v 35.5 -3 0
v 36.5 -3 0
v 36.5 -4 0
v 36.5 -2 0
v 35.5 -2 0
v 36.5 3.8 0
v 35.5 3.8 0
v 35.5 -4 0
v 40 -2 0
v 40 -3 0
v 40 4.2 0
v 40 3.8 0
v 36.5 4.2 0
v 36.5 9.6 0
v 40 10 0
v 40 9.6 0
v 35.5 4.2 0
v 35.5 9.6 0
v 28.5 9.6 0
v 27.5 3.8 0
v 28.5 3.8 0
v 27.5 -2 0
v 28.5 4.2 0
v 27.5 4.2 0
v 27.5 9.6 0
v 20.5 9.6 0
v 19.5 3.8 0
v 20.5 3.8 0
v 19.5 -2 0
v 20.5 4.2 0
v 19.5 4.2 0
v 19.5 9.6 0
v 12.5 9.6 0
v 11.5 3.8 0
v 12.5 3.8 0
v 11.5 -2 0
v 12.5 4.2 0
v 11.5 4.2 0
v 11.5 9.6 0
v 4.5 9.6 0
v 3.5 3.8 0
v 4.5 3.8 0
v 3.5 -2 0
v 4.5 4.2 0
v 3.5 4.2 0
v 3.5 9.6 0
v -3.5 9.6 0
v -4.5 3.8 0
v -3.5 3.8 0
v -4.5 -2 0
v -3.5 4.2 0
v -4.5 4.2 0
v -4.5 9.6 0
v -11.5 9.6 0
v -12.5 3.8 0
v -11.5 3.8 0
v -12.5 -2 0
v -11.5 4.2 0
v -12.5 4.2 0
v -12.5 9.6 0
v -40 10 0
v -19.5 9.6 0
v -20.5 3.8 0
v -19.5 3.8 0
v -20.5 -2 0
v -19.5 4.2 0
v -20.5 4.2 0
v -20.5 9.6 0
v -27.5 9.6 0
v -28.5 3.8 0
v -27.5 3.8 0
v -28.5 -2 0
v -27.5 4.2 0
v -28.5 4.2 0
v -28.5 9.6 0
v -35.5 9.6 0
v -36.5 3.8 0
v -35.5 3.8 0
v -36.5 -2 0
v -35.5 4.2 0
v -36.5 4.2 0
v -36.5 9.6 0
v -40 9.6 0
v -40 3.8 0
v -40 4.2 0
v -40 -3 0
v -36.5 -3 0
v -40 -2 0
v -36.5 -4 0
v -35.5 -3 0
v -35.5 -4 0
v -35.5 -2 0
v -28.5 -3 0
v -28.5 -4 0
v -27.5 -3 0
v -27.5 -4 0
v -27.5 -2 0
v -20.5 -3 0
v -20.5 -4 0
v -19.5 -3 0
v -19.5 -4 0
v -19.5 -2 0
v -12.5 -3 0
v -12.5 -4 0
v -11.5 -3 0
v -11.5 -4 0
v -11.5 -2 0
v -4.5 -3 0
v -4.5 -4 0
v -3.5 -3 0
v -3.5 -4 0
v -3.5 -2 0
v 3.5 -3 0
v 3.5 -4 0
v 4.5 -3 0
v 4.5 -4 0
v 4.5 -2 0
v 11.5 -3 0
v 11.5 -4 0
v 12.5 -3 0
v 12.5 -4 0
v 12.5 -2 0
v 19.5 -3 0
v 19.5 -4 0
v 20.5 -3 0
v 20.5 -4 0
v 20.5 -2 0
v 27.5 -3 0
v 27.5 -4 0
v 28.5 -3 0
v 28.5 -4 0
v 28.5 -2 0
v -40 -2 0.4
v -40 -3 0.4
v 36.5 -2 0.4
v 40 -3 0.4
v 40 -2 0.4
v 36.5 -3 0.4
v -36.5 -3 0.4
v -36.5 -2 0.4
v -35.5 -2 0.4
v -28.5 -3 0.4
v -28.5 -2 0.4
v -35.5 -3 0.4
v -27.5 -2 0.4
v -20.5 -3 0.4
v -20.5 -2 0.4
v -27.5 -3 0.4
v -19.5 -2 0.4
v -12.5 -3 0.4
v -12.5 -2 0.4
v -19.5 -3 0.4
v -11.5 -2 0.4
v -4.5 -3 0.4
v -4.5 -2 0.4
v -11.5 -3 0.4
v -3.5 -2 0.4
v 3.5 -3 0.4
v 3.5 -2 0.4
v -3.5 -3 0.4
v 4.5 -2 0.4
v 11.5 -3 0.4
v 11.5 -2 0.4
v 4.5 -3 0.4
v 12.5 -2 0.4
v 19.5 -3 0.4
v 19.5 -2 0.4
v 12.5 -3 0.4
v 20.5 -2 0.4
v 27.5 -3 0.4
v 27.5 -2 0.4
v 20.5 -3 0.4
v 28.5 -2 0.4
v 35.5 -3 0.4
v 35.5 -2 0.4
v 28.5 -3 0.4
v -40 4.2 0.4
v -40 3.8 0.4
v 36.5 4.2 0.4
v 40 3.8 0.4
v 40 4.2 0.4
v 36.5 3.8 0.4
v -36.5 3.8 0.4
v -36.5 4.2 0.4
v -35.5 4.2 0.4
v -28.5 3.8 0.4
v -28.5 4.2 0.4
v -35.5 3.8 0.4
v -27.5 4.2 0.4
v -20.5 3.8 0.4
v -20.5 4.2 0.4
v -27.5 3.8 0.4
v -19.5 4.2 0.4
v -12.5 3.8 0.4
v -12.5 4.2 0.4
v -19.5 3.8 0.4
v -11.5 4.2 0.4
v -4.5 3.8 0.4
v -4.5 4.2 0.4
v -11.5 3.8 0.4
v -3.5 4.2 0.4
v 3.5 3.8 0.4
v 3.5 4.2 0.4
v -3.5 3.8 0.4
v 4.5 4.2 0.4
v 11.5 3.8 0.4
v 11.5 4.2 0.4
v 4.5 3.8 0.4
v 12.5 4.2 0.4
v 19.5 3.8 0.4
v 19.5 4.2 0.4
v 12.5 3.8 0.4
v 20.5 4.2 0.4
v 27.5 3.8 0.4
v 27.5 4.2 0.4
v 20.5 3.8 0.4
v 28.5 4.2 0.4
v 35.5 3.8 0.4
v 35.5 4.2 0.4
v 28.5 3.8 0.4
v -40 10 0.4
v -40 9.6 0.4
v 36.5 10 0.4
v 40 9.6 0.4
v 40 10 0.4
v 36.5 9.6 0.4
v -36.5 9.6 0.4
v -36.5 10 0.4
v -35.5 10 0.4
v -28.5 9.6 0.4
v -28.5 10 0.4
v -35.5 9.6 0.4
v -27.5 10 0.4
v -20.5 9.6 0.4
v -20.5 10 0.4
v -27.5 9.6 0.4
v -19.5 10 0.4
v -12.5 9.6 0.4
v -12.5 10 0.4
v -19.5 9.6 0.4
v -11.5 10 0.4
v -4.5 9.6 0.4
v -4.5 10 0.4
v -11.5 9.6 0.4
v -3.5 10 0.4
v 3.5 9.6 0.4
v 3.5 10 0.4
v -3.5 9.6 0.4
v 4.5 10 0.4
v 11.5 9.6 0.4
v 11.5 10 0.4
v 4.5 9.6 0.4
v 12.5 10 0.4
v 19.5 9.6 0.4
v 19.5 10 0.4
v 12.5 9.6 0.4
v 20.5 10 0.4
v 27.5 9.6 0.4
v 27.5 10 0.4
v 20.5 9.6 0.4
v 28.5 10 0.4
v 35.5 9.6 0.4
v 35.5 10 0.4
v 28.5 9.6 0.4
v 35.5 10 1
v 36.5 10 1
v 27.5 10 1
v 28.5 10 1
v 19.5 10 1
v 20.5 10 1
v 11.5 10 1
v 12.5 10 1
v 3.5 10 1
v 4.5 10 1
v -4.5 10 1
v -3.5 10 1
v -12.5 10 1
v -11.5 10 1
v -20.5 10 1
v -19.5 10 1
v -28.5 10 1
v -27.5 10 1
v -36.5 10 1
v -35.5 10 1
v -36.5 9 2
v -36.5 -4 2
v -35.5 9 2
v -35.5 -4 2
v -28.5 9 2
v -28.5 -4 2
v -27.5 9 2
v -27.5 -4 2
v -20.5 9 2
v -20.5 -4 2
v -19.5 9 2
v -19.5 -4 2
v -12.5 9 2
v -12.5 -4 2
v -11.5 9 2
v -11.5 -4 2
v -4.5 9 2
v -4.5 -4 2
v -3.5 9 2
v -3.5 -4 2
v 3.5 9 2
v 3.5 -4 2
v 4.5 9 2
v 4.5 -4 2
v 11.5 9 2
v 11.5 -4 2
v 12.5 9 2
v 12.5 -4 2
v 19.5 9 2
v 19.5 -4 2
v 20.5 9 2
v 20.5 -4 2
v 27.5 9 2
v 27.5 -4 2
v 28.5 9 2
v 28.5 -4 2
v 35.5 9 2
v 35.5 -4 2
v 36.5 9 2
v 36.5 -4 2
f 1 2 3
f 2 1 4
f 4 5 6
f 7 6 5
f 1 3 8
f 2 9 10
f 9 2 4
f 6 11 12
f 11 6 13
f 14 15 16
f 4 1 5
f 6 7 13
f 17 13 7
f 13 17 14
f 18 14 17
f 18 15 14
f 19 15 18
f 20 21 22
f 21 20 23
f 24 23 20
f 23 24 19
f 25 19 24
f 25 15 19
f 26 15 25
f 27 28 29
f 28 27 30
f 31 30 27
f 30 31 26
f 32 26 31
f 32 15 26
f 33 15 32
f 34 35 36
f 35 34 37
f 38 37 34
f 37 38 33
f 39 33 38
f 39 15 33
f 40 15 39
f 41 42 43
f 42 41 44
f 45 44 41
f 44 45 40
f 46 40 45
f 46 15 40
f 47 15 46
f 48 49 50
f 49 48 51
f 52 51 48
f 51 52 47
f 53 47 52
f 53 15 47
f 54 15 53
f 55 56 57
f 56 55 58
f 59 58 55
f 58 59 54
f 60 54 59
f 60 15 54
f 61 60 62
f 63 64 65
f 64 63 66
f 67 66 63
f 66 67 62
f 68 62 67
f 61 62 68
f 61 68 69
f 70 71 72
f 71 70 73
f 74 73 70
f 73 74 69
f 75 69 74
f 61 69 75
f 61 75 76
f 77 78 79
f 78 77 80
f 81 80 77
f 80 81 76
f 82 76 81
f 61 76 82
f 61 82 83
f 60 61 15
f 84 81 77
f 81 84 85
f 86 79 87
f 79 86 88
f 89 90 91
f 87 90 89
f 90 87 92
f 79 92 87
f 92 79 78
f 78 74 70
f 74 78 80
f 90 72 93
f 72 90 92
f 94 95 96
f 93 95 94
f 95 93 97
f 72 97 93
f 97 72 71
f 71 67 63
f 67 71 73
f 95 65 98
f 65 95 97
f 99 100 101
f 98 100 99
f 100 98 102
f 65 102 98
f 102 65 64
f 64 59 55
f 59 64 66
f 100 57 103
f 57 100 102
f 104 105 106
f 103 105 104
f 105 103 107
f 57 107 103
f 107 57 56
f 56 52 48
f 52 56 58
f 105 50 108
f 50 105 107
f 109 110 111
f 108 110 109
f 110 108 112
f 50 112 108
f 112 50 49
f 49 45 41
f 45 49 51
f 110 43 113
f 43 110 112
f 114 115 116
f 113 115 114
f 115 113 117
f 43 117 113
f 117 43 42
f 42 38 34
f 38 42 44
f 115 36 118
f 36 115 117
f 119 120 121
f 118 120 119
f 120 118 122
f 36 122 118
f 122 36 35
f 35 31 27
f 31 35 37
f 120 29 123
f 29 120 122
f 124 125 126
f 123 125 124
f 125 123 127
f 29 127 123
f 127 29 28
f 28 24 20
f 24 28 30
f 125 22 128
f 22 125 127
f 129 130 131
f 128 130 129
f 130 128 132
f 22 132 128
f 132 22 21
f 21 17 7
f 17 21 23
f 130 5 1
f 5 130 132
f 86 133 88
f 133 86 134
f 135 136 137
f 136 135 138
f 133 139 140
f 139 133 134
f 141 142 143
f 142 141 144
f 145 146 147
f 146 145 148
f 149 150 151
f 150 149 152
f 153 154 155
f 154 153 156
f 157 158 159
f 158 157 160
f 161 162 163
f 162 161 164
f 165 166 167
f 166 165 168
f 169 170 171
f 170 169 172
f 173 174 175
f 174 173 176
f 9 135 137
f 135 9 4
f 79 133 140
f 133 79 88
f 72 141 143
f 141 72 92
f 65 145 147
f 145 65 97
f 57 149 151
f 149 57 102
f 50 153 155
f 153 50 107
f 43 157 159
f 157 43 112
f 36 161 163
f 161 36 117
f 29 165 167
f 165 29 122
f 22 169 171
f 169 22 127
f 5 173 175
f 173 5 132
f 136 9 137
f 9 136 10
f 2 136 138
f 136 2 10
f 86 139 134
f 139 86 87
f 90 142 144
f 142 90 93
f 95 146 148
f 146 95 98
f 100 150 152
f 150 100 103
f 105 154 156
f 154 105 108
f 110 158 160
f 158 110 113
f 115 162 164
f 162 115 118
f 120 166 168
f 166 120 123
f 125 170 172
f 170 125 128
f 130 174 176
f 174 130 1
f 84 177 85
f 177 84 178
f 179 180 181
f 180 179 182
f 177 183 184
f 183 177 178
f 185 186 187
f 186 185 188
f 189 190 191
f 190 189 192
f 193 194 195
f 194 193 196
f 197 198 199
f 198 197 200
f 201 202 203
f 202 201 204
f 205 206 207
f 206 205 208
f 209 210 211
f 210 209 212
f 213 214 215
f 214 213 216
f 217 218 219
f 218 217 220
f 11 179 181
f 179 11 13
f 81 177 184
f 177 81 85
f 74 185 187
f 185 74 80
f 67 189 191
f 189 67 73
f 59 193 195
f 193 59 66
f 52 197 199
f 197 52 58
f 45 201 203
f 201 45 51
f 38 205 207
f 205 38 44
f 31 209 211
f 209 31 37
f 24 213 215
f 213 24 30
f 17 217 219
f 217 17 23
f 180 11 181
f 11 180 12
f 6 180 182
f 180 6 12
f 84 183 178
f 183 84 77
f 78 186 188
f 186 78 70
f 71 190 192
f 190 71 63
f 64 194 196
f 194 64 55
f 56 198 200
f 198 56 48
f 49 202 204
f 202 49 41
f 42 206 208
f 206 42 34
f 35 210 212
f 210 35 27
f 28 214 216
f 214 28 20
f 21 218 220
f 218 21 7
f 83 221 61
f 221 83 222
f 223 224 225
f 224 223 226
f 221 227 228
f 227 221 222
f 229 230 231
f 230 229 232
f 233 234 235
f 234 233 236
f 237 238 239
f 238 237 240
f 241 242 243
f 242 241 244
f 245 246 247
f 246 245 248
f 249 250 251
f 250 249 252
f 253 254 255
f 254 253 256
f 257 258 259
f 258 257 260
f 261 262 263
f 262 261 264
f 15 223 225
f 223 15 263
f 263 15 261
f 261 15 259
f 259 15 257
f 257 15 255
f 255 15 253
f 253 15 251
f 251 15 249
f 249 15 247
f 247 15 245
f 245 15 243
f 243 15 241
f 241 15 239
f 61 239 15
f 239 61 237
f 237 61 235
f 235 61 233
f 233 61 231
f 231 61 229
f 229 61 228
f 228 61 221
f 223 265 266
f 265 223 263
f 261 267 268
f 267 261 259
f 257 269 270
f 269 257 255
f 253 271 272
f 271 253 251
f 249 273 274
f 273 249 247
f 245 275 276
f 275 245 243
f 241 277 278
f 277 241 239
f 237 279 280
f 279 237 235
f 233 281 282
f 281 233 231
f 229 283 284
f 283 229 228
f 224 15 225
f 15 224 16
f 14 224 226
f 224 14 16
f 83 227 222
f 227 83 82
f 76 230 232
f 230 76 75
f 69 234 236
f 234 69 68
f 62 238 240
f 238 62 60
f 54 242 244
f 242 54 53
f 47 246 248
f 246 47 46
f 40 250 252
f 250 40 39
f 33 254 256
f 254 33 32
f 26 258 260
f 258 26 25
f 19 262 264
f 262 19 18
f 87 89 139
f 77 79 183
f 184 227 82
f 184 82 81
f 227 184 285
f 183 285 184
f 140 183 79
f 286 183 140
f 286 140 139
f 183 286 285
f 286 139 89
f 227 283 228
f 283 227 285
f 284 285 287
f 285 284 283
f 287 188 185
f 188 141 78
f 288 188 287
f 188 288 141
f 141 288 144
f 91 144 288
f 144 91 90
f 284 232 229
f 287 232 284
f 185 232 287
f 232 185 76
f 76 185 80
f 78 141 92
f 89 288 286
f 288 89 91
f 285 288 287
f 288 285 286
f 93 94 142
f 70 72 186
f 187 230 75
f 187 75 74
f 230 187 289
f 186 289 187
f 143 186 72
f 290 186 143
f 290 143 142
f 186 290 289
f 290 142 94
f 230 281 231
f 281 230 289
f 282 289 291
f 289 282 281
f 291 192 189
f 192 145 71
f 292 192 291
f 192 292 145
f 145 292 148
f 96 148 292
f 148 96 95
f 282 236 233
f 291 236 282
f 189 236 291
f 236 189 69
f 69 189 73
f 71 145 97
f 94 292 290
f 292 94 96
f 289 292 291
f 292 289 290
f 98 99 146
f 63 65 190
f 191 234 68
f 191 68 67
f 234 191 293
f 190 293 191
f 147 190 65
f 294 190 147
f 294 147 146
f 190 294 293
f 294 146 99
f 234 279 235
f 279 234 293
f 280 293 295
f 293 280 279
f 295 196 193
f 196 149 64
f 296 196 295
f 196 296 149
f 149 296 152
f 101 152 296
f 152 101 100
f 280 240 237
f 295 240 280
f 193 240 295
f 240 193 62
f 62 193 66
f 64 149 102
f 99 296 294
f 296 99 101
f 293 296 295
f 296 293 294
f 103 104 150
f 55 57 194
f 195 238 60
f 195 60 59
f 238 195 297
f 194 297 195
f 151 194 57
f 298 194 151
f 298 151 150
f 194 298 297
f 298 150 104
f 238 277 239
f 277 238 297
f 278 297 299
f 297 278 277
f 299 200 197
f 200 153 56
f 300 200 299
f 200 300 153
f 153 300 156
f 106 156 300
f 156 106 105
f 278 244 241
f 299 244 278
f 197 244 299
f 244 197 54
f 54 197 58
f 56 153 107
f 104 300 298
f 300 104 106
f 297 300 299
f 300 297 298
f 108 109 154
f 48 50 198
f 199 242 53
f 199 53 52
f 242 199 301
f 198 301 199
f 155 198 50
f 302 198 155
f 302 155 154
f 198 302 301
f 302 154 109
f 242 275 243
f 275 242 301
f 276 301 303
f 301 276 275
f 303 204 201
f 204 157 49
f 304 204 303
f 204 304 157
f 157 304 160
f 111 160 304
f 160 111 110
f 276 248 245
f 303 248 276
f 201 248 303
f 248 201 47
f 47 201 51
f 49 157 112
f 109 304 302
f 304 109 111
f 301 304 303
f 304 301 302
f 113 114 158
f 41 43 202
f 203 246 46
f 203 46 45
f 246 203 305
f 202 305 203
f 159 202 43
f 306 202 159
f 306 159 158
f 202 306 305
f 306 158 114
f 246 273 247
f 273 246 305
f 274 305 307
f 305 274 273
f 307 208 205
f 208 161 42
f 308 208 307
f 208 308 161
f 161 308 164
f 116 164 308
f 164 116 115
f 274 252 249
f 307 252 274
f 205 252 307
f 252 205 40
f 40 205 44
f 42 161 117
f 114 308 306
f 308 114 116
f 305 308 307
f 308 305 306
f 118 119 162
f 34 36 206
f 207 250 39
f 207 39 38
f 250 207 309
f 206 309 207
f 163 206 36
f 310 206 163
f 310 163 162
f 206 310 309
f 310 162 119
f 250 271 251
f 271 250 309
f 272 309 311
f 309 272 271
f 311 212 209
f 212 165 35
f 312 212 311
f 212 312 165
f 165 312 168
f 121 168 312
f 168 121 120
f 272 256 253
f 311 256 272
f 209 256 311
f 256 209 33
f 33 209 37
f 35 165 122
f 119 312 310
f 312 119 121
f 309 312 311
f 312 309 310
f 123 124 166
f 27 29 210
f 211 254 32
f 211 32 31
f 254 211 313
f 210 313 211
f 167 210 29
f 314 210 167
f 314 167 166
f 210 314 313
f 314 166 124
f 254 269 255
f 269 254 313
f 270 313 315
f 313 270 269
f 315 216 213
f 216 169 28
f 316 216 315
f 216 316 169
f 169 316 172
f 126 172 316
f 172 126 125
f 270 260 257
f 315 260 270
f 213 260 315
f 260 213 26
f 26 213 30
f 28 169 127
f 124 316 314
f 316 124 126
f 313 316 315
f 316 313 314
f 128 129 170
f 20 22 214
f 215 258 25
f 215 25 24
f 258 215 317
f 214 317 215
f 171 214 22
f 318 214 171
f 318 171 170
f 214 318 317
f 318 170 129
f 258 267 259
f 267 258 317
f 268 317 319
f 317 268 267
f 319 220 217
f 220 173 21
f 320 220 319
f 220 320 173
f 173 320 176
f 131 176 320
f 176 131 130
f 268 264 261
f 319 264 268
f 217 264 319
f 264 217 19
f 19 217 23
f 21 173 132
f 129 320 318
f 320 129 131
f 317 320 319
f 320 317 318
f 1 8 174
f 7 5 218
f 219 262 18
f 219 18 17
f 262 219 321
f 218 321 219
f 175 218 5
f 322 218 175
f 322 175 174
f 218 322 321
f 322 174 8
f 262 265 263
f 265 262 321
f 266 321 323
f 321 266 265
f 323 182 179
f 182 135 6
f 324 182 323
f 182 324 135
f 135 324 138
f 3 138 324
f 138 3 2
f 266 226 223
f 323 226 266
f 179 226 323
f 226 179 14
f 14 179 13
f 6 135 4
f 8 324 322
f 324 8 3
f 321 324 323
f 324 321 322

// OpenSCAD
railing_bottom = -2;
railing_top    = 10;

length = 80;
railing = [
    [-2.5, [0.4, 1.0]],
    [ 4.0, [0.4, 0.4]],
    [ 9.8, [0.4, 0.4]]
];
for (r = railing) {
    pos  = r[0];
    size = r[1];
    translate([0, pos]) {
        linear_extrude(size.x) {
            square([
                length,
                size.y
            ], true);
        }
    }
}

Pillars();

module Pillars() {
    distance = 8;
    count    = 10;
    for(i = [-(count - 1) / 2:(count - 1) / 2]) {
        translate([i * distance, 0]) {
            Pillar();
        }
    }

    module Pillar(
        width     = 2,
        thickness = 1,
        bottom    = -4,
        top       = 10,
        bevel     = [1,1]
    ) {
        assert(top > bottom);
        assert(bevel.x <= width);
        assert(bevel.y <= top - bottom);
        
        rotate(-90, [0, 1, 0]) {
            linear_extrude(thickness, center = true) {
                polygon([
                    [0, bottom],
                    [width, bottom],
                    [width, top - bevel.y],
                    [width - bevel.x, top],
                    [0, top]
                ]);
            }
        }
    }
}
